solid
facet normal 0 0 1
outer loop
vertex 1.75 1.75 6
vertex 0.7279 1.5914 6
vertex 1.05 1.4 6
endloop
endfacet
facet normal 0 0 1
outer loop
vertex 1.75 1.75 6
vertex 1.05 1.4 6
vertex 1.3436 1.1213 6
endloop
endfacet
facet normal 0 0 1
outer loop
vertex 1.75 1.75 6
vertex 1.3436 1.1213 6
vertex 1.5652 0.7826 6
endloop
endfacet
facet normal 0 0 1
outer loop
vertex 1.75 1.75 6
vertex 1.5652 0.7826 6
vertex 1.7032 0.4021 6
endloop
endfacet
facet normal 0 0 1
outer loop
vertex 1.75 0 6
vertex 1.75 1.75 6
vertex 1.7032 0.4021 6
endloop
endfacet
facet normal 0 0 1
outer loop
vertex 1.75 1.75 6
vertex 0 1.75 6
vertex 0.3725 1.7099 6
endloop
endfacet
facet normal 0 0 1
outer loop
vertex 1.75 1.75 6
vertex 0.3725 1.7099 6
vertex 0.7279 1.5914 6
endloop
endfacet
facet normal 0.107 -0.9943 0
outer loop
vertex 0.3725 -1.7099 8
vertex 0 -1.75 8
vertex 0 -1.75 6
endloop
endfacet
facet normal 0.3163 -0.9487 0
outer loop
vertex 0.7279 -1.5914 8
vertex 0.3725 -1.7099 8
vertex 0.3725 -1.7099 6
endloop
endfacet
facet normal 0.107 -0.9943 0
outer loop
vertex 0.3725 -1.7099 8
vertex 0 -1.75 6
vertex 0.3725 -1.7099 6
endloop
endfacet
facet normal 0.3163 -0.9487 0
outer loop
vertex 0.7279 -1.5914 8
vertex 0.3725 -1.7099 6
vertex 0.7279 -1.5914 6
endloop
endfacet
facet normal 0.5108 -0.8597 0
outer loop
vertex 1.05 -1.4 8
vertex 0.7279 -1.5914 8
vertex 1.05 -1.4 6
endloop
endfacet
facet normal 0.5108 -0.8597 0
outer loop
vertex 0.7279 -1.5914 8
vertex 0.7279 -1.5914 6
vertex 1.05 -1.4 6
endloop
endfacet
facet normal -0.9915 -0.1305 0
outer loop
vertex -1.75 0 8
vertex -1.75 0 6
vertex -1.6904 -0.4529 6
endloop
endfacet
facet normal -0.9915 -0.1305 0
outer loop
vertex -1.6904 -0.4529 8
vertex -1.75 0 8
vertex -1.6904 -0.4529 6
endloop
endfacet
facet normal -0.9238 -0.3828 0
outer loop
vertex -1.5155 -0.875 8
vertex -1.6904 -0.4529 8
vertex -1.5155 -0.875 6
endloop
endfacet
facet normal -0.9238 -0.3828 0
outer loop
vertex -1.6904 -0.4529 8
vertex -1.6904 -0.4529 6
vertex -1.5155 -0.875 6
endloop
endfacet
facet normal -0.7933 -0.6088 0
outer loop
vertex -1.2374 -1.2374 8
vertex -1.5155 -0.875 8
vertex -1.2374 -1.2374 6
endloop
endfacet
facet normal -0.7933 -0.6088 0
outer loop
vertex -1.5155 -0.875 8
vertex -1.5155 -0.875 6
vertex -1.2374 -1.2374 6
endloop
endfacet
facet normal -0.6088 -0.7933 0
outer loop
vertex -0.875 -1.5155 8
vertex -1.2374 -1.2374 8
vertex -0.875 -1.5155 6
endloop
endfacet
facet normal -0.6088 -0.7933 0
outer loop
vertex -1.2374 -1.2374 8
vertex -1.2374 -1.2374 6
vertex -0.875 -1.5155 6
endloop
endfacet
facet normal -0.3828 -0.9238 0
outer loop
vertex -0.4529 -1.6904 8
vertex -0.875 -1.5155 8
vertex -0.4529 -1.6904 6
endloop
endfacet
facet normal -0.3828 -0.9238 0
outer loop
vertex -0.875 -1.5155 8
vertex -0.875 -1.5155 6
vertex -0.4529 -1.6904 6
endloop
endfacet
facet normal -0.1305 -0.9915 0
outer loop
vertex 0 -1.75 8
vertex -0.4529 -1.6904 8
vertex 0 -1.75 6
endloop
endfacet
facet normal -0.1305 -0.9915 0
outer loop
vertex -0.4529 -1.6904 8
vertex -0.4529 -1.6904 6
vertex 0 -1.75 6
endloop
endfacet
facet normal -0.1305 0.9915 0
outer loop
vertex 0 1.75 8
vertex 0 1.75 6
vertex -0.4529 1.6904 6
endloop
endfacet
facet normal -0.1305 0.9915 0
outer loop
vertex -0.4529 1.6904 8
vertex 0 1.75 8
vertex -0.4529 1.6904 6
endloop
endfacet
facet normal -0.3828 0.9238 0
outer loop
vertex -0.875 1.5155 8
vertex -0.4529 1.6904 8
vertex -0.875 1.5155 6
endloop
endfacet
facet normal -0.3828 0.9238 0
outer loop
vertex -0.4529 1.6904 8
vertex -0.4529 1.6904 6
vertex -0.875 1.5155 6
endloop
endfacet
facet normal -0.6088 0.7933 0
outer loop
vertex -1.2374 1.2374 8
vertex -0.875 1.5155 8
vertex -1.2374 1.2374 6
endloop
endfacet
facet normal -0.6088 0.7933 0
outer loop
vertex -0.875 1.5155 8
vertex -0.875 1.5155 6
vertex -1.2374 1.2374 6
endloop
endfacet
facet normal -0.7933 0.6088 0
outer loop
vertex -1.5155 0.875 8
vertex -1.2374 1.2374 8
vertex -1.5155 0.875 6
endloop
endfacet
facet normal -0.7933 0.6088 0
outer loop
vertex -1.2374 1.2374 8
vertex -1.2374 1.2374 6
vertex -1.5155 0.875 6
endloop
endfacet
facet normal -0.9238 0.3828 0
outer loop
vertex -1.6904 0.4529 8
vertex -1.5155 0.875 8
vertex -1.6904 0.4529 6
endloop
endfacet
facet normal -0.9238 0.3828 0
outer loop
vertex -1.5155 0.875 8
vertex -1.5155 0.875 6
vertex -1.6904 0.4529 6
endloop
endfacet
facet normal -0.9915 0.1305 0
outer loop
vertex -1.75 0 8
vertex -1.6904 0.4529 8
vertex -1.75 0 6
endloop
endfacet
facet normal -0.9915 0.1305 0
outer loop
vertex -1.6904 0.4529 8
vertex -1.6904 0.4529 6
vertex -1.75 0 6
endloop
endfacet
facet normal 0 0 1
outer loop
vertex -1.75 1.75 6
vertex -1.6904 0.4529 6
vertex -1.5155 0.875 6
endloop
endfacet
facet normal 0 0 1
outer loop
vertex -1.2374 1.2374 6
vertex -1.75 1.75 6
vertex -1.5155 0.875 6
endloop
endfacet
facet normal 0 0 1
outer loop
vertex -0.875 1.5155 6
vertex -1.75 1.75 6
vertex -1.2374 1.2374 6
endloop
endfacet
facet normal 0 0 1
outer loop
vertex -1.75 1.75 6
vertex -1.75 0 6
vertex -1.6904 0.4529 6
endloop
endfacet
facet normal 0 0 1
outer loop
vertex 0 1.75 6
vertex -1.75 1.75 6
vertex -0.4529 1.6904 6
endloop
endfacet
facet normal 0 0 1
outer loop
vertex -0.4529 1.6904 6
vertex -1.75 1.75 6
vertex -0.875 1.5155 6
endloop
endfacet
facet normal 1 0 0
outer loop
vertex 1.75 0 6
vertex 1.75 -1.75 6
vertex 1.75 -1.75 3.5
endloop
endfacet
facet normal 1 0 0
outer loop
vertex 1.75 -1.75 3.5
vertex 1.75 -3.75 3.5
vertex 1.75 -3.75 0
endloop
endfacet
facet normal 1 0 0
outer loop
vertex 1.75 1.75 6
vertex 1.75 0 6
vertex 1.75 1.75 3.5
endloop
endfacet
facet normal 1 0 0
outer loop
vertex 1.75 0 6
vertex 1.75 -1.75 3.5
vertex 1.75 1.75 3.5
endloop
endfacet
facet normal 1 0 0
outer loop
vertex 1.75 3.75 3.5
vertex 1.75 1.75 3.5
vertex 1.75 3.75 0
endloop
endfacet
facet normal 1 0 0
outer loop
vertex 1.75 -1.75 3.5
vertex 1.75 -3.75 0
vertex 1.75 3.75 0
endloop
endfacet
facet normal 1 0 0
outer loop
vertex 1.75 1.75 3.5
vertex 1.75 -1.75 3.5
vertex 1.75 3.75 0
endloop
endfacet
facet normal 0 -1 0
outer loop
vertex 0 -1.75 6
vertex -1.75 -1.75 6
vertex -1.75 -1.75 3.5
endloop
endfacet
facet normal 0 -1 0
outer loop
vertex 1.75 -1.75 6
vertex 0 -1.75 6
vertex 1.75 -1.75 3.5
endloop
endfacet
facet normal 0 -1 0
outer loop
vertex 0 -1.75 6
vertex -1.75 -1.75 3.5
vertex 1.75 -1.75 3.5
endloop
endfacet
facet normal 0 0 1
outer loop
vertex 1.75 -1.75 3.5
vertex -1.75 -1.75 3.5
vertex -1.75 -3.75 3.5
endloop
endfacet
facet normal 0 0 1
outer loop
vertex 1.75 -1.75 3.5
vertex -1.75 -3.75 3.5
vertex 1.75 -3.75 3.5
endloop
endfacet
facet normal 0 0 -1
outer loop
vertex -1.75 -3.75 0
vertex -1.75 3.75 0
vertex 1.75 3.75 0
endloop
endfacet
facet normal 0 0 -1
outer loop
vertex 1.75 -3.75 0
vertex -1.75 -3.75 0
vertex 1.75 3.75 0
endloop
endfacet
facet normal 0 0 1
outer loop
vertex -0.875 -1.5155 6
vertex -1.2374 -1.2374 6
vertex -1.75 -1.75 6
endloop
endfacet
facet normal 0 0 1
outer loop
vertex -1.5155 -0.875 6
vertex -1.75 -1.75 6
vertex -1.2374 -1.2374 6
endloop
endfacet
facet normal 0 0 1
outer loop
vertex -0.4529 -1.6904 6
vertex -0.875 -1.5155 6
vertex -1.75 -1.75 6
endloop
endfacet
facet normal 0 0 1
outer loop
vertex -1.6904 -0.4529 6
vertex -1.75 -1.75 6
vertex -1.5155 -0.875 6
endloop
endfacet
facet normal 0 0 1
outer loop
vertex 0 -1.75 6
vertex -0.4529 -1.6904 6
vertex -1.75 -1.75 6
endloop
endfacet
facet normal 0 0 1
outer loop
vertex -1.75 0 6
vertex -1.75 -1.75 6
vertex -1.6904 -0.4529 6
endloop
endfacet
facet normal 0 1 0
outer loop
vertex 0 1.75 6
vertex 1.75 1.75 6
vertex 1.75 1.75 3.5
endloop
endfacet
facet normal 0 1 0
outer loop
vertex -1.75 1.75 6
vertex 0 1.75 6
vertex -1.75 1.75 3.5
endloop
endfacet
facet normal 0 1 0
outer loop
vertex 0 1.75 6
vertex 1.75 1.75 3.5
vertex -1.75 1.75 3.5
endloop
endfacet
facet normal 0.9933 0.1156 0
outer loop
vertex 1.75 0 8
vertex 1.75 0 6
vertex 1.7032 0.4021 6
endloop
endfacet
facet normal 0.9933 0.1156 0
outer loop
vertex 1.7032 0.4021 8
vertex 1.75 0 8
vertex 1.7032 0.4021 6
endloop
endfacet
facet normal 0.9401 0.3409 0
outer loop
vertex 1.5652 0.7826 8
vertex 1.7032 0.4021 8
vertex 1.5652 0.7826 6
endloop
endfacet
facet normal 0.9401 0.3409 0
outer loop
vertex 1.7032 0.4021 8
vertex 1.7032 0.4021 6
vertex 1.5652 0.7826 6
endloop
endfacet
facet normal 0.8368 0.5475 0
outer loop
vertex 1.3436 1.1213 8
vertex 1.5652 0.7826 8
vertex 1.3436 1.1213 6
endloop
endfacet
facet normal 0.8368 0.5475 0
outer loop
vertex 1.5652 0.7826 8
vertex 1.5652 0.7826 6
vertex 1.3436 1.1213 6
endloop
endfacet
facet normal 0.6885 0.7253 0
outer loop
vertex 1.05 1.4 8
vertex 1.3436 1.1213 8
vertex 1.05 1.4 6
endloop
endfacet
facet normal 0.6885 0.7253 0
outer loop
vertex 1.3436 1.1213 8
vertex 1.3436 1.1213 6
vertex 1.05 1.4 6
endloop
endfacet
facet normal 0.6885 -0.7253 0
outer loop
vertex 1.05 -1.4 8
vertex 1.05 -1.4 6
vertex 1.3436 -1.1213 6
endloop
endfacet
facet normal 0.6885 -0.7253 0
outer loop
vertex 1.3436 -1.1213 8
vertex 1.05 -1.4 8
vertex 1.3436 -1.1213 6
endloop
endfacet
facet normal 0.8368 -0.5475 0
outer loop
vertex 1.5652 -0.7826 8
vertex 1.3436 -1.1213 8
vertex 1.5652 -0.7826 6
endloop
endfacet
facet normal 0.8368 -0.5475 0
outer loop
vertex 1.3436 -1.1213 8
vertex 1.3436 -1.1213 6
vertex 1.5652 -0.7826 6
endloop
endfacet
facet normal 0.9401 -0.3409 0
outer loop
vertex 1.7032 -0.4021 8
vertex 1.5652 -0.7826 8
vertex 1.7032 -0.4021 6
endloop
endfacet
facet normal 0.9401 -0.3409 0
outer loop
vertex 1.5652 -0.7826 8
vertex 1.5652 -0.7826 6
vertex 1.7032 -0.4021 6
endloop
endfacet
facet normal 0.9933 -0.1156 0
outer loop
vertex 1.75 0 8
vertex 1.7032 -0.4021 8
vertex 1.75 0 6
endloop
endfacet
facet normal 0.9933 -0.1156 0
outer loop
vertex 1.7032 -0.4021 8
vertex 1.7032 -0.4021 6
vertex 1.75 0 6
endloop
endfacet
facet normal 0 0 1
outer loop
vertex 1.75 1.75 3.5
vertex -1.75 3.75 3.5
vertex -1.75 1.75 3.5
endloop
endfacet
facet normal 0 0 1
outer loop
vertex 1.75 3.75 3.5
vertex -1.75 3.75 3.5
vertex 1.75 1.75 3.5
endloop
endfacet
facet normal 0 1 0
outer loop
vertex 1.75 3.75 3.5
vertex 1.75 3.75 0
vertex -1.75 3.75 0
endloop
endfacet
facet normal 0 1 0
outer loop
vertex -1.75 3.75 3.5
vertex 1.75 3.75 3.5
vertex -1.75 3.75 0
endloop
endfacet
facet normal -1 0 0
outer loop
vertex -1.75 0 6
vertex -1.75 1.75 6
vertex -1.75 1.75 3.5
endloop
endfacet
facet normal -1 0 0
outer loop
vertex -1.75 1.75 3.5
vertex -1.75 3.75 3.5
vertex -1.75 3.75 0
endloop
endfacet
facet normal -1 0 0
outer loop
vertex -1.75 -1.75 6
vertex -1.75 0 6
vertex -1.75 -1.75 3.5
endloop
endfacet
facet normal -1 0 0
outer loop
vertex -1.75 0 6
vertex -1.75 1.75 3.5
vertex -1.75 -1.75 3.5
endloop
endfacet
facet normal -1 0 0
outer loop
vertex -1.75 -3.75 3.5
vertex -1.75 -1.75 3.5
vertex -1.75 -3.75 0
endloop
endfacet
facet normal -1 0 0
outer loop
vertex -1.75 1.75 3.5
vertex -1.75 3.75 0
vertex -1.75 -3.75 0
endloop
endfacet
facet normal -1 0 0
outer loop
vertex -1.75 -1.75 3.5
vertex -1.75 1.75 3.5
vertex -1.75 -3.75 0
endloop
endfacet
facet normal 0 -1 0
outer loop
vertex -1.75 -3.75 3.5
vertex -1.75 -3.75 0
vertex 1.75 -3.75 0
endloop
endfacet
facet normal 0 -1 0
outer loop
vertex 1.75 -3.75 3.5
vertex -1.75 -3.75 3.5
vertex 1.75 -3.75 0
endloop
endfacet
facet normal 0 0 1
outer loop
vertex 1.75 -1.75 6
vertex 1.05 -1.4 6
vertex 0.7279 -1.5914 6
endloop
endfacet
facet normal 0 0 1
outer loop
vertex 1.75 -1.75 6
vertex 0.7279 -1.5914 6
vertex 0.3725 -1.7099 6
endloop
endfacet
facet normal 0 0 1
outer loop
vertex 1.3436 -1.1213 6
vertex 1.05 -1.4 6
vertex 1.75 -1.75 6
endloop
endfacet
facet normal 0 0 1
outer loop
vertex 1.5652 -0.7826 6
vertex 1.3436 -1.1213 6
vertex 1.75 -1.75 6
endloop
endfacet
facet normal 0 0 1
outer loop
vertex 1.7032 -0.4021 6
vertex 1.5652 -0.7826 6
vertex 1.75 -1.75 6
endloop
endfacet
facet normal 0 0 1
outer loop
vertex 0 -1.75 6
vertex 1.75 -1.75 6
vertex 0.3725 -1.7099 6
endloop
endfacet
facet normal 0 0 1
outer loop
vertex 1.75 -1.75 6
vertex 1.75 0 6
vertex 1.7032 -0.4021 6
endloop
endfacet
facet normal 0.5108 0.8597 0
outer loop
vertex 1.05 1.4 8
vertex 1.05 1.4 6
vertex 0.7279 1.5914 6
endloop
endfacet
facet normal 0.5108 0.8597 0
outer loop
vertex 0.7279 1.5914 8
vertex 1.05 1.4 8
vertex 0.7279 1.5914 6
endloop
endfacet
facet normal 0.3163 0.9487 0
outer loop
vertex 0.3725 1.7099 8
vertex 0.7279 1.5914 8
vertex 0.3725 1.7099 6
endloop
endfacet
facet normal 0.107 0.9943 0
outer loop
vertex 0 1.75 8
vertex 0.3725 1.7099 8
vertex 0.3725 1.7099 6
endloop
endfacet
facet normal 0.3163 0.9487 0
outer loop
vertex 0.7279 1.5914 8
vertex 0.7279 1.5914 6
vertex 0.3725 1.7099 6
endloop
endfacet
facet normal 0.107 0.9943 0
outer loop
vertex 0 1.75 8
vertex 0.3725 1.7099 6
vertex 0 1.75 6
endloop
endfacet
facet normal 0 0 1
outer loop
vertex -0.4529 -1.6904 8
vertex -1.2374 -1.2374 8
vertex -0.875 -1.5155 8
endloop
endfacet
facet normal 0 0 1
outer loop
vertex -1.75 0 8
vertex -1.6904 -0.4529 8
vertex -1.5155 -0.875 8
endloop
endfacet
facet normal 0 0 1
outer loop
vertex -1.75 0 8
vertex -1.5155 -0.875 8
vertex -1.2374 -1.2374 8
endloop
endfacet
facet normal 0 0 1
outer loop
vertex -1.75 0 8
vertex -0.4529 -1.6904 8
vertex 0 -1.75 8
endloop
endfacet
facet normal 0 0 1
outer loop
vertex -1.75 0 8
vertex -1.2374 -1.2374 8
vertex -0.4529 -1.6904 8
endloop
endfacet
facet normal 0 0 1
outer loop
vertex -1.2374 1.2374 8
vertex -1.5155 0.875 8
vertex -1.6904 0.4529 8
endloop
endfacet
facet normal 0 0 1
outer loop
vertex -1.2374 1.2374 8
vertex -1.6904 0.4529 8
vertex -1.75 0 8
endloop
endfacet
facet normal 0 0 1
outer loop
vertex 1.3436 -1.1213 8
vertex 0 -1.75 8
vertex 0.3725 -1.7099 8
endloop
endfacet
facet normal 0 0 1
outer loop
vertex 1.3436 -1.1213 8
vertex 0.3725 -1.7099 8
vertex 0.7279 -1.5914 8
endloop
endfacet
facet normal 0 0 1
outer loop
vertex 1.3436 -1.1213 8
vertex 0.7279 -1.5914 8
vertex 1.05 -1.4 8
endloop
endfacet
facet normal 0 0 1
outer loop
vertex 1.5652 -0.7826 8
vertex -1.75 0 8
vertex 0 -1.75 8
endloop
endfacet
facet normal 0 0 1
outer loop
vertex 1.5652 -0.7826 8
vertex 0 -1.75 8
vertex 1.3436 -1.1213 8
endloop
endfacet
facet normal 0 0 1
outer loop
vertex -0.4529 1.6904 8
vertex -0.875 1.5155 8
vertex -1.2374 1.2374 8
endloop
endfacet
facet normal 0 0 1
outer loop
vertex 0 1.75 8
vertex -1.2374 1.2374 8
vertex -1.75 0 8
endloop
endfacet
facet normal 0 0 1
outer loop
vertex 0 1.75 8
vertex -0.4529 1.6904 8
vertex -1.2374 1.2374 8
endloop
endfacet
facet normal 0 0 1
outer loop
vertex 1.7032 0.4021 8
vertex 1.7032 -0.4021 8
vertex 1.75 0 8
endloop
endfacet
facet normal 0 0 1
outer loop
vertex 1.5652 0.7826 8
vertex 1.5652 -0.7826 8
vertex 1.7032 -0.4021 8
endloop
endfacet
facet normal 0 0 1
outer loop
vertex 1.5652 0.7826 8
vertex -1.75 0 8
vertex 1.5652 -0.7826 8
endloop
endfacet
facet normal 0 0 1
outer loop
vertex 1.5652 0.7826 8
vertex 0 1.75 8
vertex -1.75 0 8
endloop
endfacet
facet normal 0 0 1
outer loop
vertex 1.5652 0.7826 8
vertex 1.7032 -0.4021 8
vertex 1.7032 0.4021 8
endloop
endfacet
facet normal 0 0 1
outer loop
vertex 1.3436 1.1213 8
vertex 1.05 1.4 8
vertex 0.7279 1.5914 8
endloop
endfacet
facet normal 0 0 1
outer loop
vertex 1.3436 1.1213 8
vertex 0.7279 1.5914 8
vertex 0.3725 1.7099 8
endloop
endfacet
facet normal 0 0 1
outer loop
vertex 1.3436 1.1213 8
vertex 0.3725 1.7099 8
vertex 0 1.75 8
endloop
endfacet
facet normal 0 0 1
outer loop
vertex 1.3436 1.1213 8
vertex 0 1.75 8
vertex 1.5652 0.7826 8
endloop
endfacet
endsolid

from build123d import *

# Parameters (mm, degrees)
F1_DEPTH = 3.5
F2_DEPTH = 8
F3_DEPTH = 6


with BuildPart() as f1:
    # F0 (on Top) → F1 (new body)
    with BuildSketch(Plane.XY):
        with BuildLine():
            Line((1.05, -1.4), (1.75, -1.75))
            Line((1.75, -1.75), (1.75, 0))
            ThreePointArc((1.75, 0), (1.5652475842, -0.7826237921), (1.05, -1.4))
        make_face()
        Polygon((0, 1.75), (1.75, 1.75), (1.75, 3.75), (-1.75, 3.75), (-1.75, 1.75), align=None)
        Polygon((-1.75, -3.75), (1.75, -3.75), (1.75, -1.75), (0, -1.75), (-1.75, -1.75), align=None)
        with BuildLine():
            Line((0, -1.75), (1.75, -1.75))
            Line((1.75, -1.75), (1.05, -1.4))
            ThreePointArc((1.05, -1.4), (0.5533985905, -1.6601957716), (0, -1.75))
        make_face()
        with BuildLine():
            ThreePointArc((-1.75, 0), (-1.2374368671, -1.2374368671), (0, -1.75))
            ThreePointArc((0, -1.75), (0.5533985905, -1.6601957716), (1.05, -1.4))
            Line((1.05, -1.4), (-1.75, 0))
        make_face()
        with BuildLine():
            ThreePointArc((0, 1.75), (-1.2374368671, 1.2374368671), (-1.75, 0))
            Line((-1.75, 0), (1.05, 1.4))
            ThreePointArc((1.05, 1.4), (0.5533985905, 1.6601957716), (0, 1.75))
        make_face()
        with BuildLine():
            Line((1.05, 1.4), (1.75, 1.75))
            Line((1.75, 1.75), (0, 1.75))
            ThreePointArc((0, 1.75), (0.5533985905, 1.6601957716), (1.05, 1.4))
        make_face()
        with BuildLine():
            Line((-1.75, 0), (-1.75, -1.75))
            Line((-1.75, -1.75), (0, -1.75))
            ThreePointArc((0, -1.75), (-1.2374368671, -1.2374368671), (-1.75, 0))
        make_face()
        with BuildLine():
            ThreePointArc((1.05, -1.4), (1.5652475842, -0.7826237921), (1.75, 0))
            ThreePointArc((1.75, 0), (1.5652475842, 0.7826237921), (1.05, 1.4))
            Line((1.05, 1.4), (-1.75, 0))
            Line((-1.75, 0), (1.05, -1.4))
        make_face()
        with BuildLine():
            Line((-1.75, 1.75), (-1.75, 0))
            ThreePointArc((-1.75, 0), (-1.2374368671, 1.2374368671), (0, 1.75))
            Line((0, 1.75), (-1.75, 1.75))
        make_face()
        with BuildLine():
            ThreePointArc((1.05, 1.4), (1.5652475842, 0.7826237921), (1.75, 0))
            Line((1.75, 0), (1.75, 1.75))
            Line((1.75, 1.75), (1.05, 1.4))
        make_face()
    extrude(amount=F1_DEPTH)

    # F0 (on Top) → F2 (join)
    with BuildSketch(Plane.XY):
        with BuildLine():
            ThreePointArc((1.05, -1.4), (1.5652475842, -0.7826237921), (1.75, 0))
            ThreePointArc((1.75, 0), (1.5652475842, 0.7826237921), (1.05, 1.4))
            Line((1.05, 1.4), (-1.75, 0))
            Line((-1.75, 0), (1.05, -1.4))
        make_face()
        with BuildLine():
            ThreePointArc((-1.75, 0), (-1.2374368671, -1.2374368671), (0, -1.75))
            ThreePointArc((0, -1.75), (0.5533985905, -1.6601957716), (1.05, -1.4))
            Line((1.05, -1.4), (-1.75, 0))
        make_face()
        with BuildLine():
            ThreePointArc((0, 1.75), (-1.2374368671, 1.2374368671), (-1.75, 0))
            Line((-1.75, 0), (1.05, 1.4))
            ThreePointArc((1.05, 1.4), (0.5533985905, 1.6601957716), (0, 1.75))
        make_face()
    extrude(amount=F2_DEPTH)

    # F0 (on Top) → F3 (join)
    with BuildSketch(Plane.XY):
        with BuildLine():
            Line((0, -1.75), (1.75, -1.75))
            Line((1.75, -1.75), (1.05, -1.4))
            ThreePointArc((1.05, -1.4), (0.5533985905, -1.6601957716), (0, -1.75))
        make_face()
        with BuildLine():
            ThreePointArc((-1.75, 0), (-1.2374368671, -1.2374368671), (0, -1.75))
            ThreePointArc((0, -1.75), (0.5533985905, -1.6601957716), (1.05, -1.4))
            Line((1.05, -1.4), (-1.75, 0))
        make_face()
        with BuildLine():
            ThreePointArc((0, 1.75), (-1.2374368671, 1.2374368671), (-1.75, 0))
            Line((-1.75, 0), (1.05, 1.4))
            ThreePointArc((1.05, 1.4), (0.5533985905, 1.6601957716), (0, 1.75))
        make_face()
        with BuildLine():
            Line((1.05, 1.4), (1.75, 1.75))
            Line((1.75, 1.75), (0, 1.75))
            ThreePointArc((0, 1.75), (0.5533985905, 1.6601957716), (1.05, 1.4))
        make_face()
        with BuildLine():
            Line((1.05, -1.4), (1.75, -1.75))
            Line((1.75, -1.75), (1.75, 0))
            ThreePointArc((1.75, 0), (1.5652475842, -0.7826237921), (1.05, -1.4))
        make_face()
        with BuildLine():
            ThreePointArc((1.05, 1.4), (1.5652475842, 0.7826237921), (1.75, 0))
            Line((1.75, 0), (1.75, 1.75))
            Line((1.75, 1.75), (1.05, 1.4))
        make_face()
        with BuildLine():
            Line((-1.75, 0), (-1.75, -1.75))
            Line((-1.75, -1.75), (0, -1.75))
            ThreePointArc((0, -1.75), (-1.2374368671, -1.2374368671), (-1.75, 0))
        make_face()
        with BuildLine():
            Line((-1.75, 1.75), (-1.75, 0))
            ThreePointArc((-1.75, 0), (-1.2374368671, 1.2374368671), (0, 1.75))
            Line((0, 1.75), (-1.75, 1.75))
        make_face()
    extrude(amount=F3_DEPTH)


solid = f1.part
